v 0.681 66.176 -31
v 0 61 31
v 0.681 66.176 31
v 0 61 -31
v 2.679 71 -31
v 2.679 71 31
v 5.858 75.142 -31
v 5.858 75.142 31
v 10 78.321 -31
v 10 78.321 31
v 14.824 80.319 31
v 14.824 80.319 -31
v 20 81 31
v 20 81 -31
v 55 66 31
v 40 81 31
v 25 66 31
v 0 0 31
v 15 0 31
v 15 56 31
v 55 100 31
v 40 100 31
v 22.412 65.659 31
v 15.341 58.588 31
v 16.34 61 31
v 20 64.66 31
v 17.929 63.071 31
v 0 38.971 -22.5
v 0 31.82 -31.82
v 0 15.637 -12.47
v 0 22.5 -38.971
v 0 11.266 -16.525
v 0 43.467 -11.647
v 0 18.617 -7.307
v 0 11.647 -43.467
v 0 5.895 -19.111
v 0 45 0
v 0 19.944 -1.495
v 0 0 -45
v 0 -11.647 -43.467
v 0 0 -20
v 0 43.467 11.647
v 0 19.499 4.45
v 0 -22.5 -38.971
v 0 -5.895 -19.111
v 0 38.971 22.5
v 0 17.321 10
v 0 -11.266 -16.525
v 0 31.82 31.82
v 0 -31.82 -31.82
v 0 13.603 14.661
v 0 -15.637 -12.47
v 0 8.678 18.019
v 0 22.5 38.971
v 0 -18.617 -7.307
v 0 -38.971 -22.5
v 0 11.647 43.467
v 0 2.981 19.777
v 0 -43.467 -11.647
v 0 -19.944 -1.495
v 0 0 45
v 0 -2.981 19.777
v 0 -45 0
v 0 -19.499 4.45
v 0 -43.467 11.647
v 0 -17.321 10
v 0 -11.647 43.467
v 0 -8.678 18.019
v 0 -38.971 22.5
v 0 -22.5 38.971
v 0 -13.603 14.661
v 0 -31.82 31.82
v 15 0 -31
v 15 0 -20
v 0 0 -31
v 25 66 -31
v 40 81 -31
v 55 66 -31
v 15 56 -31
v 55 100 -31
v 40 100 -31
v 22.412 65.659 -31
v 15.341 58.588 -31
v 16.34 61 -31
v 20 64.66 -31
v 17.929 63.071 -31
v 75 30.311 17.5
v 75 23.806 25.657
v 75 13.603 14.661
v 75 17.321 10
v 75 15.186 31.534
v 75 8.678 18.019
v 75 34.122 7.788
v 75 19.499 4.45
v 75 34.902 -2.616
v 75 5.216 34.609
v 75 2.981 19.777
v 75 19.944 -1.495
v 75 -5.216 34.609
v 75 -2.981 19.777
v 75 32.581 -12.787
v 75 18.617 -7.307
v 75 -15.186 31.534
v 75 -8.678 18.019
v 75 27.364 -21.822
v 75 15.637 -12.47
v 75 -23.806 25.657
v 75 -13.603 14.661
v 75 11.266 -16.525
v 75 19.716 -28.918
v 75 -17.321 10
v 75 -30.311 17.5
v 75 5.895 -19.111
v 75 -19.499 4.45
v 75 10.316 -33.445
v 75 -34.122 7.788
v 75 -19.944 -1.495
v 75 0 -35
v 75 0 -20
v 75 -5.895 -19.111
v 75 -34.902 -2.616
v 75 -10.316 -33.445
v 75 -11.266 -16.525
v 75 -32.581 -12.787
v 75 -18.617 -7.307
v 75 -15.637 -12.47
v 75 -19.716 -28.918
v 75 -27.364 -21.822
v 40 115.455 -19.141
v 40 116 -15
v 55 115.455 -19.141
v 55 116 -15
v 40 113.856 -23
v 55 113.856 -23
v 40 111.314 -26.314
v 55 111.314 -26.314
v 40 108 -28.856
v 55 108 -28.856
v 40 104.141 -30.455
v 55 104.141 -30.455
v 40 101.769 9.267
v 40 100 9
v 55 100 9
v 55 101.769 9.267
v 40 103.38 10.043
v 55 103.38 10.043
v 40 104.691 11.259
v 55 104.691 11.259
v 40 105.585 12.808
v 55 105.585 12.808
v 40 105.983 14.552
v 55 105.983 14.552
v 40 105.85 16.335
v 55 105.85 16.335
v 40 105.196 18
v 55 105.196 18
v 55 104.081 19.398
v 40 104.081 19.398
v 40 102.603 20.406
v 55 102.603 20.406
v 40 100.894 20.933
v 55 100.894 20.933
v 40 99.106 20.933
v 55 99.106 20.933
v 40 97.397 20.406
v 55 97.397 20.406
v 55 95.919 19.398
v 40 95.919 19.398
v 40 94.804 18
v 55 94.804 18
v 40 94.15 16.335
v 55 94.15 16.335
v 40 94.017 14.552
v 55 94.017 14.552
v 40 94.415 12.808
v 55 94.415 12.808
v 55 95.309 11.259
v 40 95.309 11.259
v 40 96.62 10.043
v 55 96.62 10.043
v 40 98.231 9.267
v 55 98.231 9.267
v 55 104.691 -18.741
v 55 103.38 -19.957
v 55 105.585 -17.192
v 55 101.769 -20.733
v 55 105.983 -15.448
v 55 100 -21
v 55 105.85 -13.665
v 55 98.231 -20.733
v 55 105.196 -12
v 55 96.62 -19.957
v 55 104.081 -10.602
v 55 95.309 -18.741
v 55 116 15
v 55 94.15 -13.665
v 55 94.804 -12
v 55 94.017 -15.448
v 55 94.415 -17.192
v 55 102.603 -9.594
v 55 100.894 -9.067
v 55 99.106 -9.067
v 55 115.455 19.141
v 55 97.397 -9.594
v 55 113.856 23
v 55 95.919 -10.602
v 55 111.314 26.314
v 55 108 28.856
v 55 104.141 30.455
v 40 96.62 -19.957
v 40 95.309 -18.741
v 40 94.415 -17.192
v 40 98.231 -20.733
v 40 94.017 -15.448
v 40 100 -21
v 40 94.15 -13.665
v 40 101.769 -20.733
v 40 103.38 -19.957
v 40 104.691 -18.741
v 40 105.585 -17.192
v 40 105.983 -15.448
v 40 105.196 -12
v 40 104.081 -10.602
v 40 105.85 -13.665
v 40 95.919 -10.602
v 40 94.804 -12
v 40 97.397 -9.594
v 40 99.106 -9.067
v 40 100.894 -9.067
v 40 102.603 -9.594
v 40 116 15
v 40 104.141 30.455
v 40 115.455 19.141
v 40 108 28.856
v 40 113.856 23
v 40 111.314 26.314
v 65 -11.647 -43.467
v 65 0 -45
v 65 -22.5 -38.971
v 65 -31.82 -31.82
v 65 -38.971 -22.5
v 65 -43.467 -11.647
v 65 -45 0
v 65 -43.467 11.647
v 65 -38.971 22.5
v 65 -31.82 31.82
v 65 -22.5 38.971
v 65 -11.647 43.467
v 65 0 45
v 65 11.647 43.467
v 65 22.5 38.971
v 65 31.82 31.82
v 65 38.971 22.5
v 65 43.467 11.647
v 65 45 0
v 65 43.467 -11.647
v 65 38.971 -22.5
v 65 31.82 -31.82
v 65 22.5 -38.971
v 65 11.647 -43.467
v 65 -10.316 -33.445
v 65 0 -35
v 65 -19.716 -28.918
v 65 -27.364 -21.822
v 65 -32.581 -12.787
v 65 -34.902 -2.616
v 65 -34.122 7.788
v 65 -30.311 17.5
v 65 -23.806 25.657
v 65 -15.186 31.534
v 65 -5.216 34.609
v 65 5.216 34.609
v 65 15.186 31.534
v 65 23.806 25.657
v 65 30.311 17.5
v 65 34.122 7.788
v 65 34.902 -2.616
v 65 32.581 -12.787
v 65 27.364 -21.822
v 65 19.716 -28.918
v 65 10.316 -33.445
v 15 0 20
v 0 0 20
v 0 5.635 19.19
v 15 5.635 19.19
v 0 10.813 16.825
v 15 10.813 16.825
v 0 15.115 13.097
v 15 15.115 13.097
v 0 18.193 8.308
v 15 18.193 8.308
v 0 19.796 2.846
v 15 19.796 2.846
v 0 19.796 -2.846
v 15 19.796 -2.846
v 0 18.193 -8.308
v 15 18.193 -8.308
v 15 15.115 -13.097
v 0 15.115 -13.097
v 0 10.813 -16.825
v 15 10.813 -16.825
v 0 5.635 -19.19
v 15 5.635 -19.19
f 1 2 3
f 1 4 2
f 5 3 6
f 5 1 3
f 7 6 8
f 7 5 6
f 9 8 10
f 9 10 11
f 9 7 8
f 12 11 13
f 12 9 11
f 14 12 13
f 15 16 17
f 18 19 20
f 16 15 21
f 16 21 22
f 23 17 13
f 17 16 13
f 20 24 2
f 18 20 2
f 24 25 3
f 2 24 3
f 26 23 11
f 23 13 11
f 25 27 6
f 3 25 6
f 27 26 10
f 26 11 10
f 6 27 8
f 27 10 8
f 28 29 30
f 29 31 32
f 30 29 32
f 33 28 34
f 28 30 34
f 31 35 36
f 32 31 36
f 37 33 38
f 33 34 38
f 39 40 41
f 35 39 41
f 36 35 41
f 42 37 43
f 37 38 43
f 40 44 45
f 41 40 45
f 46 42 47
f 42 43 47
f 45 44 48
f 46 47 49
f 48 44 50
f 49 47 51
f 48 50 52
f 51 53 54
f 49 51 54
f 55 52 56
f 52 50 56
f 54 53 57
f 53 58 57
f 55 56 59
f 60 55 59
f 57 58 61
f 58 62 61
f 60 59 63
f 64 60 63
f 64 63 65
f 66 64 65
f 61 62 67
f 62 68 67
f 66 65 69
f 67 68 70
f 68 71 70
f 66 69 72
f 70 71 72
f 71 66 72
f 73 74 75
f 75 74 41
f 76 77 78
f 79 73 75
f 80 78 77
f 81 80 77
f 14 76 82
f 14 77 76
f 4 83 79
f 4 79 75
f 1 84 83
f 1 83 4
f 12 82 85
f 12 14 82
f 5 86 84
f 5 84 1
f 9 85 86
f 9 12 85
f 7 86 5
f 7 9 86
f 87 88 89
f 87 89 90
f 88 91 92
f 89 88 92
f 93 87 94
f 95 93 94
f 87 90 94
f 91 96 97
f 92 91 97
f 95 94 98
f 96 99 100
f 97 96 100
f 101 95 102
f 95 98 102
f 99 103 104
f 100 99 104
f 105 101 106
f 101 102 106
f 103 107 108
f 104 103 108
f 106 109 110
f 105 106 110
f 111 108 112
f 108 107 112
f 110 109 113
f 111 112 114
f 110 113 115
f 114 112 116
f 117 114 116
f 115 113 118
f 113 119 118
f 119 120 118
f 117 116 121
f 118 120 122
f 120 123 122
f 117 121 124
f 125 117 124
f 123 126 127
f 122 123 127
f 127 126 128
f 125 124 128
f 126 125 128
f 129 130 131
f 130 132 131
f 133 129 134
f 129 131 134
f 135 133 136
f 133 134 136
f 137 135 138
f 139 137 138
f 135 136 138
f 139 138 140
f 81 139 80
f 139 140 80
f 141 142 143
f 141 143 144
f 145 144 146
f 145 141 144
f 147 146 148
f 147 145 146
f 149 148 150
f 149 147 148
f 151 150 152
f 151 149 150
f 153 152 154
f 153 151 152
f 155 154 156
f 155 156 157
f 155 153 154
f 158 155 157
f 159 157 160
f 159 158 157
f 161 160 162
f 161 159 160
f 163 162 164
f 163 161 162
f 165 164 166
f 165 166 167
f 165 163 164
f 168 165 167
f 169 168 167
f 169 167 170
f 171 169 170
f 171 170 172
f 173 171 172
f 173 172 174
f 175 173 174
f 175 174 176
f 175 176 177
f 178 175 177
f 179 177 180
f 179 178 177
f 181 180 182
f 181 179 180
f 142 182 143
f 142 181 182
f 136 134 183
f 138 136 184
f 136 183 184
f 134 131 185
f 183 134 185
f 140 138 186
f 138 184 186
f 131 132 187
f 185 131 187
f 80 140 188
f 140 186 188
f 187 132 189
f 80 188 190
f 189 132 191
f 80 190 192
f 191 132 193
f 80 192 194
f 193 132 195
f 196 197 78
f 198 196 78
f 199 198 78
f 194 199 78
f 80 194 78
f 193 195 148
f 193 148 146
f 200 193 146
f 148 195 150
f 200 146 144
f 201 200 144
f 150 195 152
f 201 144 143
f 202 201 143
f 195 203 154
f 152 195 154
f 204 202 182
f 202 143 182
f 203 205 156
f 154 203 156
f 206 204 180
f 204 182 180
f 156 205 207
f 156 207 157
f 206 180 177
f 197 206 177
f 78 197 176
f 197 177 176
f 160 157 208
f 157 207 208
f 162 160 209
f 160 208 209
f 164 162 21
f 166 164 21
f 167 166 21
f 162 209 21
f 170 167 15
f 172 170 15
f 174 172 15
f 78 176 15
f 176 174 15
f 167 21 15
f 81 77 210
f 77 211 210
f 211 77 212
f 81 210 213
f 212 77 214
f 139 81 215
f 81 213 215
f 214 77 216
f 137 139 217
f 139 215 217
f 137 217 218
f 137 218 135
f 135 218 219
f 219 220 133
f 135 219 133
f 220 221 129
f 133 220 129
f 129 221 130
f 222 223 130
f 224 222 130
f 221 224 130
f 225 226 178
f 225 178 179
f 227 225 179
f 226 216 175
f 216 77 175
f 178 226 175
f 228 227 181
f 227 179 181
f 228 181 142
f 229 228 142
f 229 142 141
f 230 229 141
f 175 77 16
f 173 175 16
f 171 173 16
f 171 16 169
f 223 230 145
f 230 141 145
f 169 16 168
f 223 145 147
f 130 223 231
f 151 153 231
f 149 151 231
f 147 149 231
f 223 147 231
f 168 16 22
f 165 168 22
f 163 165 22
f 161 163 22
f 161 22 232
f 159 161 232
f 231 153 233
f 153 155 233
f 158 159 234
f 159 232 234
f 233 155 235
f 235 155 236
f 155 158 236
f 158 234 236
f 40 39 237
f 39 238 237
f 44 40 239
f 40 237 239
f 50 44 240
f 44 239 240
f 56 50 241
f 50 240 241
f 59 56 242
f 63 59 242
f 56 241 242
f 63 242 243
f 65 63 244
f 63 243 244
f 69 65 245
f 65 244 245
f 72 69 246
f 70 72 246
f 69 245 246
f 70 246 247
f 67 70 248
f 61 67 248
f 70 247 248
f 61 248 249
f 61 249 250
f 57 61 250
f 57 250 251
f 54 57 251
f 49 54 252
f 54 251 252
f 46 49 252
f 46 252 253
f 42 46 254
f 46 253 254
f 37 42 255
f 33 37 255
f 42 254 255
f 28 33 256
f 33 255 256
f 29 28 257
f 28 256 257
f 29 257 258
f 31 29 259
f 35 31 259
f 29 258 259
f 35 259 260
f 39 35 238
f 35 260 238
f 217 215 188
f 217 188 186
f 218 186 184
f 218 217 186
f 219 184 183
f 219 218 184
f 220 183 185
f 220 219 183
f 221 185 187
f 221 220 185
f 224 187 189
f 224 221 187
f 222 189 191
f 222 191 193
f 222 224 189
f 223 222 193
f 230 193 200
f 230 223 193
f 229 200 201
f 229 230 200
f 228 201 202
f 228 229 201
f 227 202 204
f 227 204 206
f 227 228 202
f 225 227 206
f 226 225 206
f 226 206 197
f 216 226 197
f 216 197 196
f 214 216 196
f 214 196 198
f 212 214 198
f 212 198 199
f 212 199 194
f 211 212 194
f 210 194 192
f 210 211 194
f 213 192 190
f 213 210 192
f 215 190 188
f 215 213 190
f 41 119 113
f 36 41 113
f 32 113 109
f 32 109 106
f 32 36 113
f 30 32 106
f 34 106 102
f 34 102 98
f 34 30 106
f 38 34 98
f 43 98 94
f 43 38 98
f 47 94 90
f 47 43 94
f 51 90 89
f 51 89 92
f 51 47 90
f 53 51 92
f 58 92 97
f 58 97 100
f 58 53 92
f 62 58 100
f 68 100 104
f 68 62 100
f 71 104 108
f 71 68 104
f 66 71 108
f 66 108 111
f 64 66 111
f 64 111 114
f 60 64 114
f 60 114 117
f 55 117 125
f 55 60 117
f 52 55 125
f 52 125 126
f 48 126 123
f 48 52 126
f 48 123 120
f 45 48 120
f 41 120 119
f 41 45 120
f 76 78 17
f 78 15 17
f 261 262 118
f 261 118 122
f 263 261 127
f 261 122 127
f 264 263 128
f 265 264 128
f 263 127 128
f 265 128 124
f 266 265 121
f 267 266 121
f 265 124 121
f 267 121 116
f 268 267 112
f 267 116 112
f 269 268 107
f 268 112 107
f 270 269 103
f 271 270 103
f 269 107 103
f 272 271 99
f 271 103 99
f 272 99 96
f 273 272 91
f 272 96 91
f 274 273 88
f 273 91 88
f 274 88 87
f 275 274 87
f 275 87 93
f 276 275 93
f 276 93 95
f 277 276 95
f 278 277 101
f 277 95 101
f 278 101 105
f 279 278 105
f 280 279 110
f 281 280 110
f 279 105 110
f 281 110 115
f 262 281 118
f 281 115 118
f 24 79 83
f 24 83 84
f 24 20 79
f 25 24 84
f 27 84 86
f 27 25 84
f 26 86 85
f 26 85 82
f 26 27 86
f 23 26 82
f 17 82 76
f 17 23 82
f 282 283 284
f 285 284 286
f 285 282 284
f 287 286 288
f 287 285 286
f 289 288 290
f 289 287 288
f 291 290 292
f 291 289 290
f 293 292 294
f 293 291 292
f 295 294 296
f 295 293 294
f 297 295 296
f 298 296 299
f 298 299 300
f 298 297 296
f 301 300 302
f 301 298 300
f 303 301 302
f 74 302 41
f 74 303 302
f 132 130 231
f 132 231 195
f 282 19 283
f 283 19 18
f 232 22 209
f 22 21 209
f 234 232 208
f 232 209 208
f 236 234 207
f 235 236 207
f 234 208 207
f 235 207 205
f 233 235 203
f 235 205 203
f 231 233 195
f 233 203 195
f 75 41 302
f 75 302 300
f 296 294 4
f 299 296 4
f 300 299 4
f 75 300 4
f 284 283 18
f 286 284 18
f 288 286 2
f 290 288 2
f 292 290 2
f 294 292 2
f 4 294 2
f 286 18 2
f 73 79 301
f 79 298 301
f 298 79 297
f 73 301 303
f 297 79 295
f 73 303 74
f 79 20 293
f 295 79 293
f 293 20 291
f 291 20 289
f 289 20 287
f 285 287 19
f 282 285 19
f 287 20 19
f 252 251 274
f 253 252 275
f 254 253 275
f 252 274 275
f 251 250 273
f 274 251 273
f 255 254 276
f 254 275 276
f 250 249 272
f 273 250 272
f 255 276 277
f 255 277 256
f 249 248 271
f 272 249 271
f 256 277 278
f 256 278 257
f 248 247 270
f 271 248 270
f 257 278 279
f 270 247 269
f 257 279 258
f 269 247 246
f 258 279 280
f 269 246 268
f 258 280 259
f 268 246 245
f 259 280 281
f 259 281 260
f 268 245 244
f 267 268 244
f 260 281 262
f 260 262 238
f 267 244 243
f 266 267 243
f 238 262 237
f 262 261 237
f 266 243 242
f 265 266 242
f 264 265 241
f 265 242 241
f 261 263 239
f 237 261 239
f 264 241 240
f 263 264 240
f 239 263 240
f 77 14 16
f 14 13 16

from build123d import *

# Parameters (mm, degrees)
BOSS_EXTRUDE1_DEPTH = 31
SKETCH7_W           = 20
SKETCH7_H           = 75
SKETCH9_W           = 20
SKETCH9_H           = 75
FILLET1_R           = 10
FILLET2_R           = 20
FILLET3_R           = 16
SKETCH11_W          = 6
SKETCH11_H          = 55
HOLE4_AT_2_COUNT    = 2
HOLE4_AT_2_PITCH    = 30


with BuildPart() as part:
    # Sketch1 → Revolve1 (revolve)
    with BuildSketch(Plane.XY, mode=Mode.PRIVATE) as revolve1_sk:
        Polygon((0, 0), (0, 45), (65, 45), (65, 35), (75, 35), (75, 0), align=None)
    revolve(revolve1_sk.sketch.rotate(Axis((75, 0, 0), (-1, 0, 0)), 90), axis=Axis((75, 0, 0), (-1, 0, 0)))

    # Sketch9 → Hole3 (revolve, cut)
    with BuildSketch(Plane(origin=(75, 0, 0), x_dir=(0, 0, -1), z_dir=(0, 1, 0))):
        with Locations((10, 37.5)):
            Rectangle(SKETCH9_W, SKETCH9_H)
    revolve(axis=Axis((-35, 0, 0), (1, 0, 0)), mode=Mode.SUBTRACT)


with BuildPart() as body_2:
    # Sketch4 → Boss-Extrude1 (new, symmetric)
    with BuildSketch(Plane.XY):
        Polygon((0, 0), (0, 81), (40, 81), (40, 116), (55, 116), (55, 66), (15, 66), (15, 0), align=None)
    extrude(amount=BOSS_EXTRUDE1_DEPTH, both=True)

    # Sketch7 → Hole2 (revolve, cut)
    with BuildSketch(Plane.ZX):
        with Locations((10, 37.5)):
            Rectangle(SKETCH7_W, SKETCH7_H)
    revolve(axis=Axis((110, 0, 0), (-1, 0, 0)), mode=Mode.SUBTRACT)

    # Fillet1
    fillet1_edges = [body_2.edges().sort_by_distance(p)[0] for p in [
        (15, 66, 0),
    ]]
    fillet(fillet1_edges, radius=FILLET1_R)

    # Fillet2
    fillet2_edges = [body_2.edges().sort_by_distance(p)[0] for p in [
        (0, 81, 0),
    ]]
    fillet(fillet2_edges, radius=FILLET2_R)

    # Fillet3
    fillet3_edges = [body_2.edges().sort_by_distance(p)[0] for p in [
        (47.5, 116, 31),
        (47.5, 116, -31),
    ]]
    fillet(fillet3_edges, radius=FILLET3_R)

    # Sketch11 → Hole4 (revolve, cut)
    with BuildSketch(Plane(origin=(55, 100, -15), x_dir=(0, 0, -1), z_dir=(0, 1, 0))):
        with Locations((3, 27.5)):
            Rectangle(SKETCH11_W, SKETCH11_H)
    hole4 = revolve(axis=Axis((-55, 100, -15), (1, 0, 0)), mode=Mode.SUBTRACT)

    # Hole4 at 2: Hole4 ×2
    with Locations(*[(0, 0, i * HOLE4_AT_2_PITCH) for i in range(1, HOLE4_AT_2_COUNT)]):
        add(hole4, mode=Mode.SUBTRACT)


solid = Compound([part.part, body_2.part])
